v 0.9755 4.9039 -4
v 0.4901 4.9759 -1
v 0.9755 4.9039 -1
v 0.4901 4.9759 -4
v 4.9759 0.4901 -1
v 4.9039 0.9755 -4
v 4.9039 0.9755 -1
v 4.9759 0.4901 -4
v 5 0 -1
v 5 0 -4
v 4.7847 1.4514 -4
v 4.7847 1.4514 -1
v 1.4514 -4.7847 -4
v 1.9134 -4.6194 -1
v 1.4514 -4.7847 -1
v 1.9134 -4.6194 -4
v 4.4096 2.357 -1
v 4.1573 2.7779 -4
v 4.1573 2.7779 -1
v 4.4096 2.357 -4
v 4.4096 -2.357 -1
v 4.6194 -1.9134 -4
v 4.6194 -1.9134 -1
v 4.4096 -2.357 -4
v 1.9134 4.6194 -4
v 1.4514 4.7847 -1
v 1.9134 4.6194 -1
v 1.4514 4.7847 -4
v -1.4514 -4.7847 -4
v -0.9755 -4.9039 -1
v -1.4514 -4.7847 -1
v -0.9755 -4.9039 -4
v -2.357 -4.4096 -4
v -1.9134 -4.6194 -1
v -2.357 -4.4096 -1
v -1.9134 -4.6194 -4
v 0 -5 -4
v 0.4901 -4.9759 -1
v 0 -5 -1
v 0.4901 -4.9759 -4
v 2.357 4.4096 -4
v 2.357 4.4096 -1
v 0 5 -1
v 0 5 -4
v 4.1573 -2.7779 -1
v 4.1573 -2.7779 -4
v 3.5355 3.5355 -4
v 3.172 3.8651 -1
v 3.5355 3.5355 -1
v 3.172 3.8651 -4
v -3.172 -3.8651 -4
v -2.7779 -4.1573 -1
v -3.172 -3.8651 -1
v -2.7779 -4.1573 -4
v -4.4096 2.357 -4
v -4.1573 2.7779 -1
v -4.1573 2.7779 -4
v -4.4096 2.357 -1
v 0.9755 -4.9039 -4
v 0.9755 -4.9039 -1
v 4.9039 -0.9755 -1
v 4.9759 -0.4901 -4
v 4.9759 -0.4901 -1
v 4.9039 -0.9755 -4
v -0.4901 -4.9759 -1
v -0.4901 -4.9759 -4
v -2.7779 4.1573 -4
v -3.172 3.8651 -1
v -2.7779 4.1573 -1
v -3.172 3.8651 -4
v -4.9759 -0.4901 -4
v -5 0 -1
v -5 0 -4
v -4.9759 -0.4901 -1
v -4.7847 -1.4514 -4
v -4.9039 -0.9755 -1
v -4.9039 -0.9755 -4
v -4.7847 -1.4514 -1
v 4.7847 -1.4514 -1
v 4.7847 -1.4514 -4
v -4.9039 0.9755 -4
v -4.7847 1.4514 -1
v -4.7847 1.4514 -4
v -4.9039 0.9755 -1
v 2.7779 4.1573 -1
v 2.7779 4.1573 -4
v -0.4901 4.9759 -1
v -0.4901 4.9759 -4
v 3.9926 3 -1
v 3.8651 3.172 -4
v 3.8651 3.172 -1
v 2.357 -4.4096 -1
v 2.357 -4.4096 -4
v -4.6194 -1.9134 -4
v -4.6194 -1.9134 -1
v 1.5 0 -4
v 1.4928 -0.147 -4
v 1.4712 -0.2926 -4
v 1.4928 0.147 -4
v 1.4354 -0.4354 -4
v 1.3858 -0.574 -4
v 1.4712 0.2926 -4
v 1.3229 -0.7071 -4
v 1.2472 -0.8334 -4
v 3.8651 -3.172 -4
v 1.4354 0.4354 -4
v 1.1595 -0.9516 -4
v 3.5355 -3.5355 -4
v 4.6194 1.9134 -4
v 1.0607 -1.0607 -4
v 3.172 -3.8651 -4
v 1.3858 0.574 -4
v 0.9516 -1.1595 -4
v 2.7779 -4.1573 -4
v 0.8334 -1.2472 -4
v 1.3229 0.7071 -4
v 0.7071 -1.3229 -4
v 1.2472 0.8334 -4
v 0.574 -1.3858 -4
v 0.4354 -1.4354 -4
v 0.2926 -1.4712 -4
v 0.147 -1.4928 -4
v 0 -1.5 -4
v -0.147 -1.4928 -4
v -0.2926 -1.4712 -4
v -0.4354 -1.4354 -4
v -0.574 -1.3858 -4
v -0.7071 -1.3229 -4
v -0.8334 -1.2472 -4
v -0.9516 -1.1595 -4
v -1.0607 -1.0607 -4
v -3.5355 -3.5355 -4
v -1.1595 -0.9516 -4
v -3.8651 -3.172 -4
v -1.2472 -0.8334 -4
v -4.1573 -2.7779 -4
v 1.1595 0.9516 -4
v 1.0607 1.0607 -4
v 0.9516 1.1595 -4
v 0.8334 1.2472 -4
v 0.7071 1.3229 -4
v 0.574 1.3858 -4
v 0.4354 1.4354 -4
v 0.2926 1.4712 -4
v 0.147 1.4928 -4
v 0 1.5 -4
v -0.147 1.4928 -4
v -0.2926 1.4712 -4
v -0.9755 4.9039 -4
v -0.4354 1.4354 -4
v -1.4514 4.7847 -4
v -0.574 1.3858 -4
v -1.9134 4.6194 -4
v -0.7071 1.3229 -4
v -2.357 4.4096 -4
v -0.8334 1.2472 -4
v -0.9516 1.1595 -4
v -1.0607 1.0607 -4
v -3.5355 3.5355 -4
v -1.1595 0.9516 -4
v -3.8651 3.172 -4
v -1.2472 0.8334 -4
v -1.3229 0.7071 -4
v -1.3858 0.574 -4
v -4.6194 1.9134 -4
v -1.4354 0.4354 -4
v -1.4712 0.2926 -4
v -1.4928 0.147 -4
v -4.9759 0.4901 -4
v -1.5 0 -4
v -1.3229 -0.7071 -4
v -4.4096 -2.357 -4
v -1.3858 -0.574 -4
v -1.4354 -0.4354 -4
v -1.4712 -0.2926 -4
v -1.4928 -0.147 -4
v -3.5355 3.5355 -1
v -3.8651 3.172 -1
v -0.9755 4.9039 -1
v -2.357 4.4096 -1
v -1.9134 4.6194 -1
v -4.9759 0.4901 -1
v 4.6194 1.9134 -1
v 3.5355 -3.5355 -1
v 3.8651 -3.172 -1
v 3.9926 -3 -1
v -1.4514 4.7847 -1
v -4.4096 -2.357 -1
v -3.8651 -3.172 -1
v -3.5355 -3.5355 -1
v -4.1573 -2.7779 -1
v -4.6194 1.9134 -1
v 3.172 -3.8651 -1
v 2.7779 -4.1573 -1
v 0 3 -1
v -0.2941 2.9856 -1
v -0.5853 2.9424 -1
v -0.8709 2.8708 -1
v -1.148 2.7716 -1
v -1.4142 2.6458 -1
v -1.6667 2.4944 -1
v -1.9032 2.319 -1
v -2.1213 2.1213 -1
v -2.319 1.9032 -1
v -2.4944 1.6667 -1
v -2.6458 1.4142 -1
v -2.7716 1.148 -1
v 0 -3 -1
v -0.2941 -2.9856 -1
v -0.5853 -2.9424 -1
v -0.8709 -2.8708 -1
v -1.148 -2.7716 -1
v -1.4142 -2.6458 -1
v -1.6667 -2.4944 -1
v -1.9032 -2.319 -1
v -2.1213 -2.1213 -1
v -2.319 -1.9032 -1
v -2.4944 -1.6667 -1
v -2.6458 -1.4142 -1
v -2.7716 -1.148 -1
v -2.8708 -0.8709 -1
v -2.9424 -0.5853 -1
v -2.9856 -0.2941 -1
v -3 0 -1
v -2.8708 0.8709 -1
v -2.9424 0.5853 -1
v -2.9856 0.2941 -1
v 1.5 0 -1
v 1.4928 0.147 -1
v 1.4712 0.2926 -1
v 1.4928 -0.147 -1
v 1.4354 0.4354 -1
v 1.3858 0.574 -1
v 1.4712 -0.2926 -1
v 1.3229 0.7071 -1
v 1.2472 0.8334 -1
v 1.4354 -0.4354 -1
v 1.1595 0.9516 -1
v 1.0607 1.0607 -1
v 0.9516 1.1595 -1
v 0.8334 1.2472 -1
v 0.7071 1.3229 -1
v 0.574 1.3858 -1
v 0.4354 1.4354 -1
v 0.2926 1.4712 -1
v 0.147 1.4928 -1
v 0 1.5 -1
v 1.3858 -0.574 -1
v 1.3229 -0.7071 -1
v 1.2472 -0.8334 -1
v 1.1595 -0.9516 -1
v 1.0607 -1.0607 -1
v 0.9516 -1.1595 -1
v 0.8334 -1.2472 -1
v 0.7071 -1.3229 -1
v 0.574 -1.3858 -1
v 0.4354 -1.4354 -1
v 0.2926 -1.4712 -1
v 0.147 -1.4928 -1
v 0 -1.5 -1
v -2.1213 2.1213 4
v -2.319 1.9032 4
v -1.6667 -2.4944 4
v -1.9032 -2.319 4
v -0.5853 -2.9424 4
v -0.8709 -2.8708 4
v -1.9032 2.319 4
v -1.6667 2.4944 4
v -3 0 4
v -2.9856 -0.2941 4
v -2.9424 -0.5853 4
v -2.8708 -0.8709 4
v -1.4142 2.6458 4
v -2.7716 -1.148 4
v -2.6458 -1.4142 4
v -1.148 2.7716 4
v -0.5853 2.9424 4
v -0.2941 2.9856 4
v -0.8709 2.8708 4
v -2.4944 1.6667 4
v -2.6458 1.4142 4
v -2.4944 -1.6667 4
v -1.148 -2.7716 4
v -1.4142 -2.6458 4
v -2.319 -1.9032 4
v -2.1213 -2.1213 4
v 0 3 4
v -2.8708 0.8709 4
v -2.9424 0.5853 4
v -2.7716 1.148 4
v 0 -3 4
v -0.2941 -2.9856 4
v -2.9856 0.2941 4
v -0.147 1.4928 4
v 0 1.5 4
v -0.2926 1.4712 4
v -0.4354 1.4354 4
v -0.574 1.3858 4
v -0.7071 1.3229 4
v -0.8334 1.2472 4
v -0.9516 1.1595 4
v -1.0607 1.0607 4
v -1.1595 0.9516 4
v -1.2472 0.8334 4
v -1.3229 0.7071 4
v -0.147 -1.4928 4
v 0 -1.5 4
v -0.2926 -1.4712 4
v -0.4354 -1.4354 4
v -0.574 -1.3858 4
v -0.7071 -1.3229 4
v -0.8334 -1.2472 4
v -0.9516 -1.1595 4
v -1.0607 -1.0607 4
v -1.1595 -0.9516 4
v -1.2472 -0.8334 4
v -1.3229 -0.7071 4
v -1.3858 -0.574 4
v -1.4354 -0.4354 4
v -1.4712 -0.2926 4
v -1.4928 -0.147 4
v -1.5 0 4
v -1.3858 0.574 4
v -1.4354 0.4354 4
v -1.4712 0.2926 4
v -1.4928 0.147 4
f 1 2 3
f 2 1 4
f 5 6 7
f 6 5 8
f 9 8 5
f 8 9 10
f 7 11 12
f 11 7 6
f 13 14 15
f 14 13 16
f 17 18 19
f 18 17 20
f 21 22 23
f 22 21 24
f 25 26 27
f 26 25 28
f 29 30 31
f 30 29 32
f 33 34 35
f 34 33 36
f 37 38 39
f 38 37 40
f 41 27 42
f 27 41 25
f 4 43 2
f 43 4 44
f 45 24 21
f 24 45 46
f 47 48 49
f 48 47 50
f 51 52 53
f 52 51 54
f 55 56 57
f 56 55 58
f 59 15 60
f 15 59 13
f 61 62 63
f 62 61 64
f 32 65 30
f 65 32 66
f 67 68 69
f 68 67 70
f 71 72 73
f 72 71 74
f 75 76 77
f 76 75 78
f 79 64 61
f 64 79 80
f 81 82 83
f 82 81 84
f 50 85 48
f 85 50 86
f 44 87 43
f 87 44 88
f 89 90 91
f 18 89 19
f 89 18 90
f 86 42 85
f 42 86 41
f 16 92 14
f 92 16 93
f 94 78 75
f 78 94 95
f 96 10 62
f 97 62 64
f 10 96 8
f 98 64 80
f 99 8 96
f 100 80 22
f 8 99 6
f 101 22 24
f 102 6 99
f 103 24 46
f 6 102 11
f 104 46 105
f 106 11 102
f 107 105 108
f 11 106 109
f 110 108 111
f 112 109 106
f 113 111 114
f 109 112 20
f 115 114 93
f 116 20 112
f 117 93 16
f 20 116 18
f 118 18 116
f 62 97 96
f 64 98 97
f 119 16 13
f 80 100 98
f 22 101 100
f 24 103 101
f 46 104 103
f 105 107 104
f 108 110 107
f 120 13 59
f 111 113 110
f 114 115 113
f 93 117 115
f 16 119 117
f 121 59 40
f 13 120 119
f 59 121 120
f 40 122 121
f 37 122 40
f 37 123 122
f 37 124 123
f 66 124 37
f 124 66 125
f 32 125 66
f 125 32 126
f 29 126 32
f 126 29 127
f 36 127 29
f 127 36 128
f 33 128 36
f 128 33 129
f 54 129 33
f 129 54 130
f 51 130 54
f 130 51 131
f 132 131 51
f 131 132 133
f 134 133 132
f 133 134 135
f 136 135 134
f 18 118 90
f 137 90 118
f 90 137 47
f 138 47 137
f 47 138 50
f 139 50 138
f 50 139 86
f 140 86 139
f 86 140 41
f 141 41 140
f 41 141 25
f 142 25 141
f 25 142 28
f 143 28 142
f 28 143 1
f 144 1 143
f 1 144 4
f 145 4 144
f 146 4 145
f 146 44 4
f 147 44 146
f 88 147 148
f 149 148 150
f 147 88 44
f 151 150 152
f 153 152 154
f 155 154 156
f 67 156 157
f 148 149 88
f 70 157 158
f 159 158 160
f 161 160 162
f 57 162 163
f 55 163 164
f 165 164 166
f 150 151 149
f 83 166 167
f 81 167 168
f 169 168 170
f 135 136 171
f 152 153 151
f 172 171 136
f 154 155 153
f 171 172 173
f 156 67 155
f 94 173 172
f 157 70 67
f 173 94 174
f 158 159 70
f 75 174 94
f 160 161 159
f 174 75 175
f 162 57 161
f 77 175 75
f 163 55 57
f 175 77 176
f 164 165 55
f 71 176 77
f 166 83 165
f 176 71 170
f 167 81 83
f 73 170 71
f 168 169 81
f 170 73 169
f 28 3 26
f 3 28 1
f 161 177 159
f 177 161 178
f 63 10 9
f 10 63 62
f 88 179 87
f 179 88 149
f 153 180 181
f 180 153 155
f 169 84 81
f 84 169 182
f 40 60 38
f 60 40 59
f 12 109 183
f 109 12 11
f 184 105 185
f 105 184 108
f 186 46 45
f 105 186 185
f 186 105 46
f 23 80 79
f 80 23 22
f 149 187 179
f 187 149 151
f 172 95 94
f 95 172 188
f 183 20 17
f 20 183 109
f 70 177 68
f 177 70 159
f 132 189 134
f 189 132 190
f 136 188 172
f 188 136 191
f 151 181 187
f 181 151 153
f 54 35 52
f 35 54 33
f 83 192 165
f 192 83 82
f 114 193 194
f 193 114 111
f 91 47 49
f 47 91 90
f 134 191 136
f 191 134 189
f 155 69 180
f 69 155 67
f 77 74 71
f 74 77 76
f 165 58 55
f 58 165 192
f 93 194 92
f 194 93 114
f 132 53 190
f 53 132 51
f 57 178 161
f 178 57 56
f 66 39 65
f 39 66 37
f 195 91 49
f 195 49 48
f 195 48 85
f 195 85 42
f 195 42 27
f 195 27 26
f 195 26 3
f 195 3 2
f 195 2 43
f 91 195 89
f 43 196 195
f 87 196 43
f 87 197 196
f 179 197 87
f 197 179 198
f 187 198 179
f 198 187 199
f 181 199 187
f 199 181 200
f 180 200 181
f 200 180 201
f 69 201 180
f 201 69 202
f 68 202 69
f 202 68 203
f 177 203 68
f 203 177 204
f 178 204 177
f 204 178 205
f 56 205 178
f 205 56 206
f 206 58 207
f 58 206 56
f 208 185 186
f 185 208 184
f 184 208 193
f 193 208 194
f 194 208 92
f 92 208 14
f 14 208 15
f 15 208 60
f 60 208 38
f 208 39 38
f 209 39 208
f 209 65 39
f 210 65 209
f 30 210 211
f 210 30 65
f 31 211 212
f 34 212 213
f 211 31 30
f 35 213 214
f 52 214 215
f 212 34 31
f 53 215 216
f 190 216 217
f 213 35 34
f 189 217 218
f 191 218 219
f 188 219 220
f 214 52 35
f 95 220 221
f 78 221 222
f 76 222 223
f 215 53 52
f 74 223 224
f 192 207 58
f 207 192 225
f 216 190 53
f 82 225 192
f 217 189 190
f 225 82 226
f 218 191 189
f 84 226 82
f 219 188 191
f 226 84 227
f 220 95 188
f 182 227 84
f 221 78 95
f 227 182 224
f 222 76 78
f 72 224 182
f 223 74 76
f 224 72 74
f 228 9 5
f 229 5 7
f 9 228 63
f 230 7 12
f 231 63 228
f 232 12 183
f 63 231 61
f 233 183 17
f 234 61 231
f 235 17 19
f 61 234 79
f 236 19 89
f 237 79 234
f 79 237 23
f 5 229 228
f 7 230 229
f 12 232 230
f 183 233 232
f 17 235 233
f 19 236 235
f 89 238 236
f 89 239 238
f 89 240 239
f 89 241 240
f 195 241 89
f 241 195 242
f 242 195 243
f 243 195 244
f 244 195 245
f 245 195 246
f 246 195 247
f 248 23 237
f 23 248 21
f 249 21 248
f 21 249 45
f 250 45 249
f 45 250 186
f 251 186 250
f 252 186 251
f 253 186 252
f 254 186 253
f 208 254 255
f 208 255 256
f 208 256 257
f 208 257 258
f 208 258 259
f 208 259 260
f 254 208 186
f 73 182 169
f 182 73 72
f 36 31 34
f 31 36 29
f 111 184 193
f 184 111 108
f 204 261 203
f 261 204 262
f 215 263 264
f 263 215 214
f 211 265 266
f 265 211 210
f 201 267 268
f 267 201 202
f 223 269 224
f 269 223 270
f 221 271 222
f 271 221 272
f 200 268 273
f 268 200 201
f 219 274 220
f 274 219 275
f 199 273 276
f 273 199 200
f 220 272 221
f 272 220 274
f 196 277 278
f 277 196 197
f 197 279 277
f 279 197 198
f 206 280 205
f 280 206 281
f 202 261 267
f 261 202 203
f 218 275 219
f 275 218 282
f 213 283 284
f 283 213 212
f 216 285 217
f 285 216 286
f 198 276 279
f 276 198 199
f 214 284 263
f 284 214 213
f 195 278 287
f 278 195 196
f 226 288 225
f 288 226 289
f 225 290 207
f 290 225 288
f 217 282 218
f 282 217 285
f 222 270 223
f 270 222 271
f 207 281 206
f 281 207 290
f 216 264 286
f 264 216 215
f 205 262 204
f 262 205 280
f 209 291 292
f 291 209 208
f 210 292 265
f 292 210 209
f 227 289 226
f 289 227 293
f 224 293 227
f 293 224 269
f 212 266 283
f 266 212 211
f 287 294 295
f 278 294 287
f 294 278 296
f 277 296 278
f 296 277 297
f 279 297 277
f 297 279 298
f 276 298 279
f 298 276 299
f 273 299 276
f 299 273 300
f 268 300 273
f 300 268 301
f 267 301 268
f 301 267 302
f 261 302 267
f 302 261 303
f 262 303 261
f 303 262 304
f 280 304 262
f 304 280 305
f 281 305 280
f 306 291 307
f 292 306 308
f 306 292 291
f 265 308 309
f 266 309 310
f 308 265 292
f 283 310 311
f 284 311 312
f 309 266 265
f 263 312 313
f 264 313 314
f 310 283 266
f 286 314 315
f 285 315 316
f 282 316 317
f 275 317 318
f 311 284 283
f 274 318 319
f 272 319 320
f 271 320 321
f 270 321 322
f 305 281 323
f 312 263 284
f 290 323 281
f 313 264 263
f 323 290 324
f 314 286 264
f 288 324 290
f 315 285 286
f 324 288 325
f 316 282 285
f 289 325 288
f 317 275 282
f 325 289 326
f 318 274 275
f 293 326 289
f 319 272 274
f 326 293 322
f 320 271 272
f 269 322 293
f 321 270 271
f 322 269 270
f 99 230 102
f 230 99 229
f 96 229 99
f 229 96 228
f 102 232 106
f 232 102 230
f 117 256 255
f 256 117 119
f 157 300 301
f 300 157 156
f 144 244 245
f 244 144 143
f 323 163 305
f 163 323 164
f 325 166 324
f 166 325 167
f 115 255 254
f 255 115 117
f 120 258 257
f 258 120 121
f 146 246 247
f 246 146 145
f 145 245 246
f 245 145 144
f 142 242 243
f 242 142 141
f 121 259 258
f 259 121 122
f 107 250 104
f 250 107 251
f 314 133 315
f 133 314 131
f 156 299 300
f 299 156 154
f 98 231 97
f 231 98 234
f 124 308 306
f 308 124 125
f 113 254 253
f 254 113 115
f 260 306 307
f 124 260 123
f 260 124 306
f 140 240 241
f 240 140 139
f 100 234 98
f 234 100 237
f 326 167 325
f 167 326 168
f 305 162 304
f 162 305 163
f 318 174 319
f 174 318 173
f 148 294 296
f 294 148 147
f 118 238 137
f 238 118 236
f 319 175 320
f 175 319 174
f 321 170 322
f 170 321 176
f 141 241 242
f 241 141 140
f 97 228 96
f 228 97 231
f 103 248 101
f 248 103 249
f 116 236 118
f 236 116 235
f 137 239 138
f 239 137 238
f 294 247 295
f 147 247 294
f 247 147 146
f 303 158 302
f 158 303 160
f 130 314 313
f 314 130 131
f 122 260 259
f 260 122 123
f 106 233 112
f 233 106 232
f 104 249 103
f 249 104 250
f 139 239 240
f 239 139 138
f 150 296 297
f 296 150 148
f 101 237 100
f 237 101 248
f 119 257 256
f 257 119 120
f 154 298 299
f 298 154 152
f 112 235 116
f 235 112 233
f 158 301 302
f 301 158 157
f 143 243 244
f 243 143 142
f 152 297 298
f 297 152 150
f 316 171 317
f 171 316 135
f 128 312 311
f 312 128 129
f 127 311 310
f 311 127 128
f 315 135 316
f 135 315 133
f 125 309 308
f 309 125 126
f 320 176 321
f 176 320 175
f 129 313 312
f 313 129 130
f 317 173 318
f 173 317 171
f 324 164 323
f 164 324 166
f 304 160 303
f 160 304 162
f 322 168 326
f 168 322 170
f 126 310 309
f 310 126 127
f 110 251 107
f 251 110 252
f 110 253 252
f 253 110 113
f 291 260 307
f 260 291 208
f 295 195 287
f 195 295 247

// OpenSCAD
module stepped_bushing() {
    difference() {
        union() {
            // Base flange
            cylinder(h=3.0, d=10.0, $fn=64);
            // Upper boss
            translate([0, 0, 3.0])
                cylinder(h=5.0, d=6.0, $fn=64);
        }
        // Central bore
        translate([0, 0, -1.0])
            cylinder(h=10.0, d=3.0, $fn=64);
        // Side cutout on the upper boss
        translate([0, -3.0, 3.0])
            cube([6.0, 6.0, 5.0], center=false);
    }
}

translate([0, 0, -4.0])
    stepped_bushing();
